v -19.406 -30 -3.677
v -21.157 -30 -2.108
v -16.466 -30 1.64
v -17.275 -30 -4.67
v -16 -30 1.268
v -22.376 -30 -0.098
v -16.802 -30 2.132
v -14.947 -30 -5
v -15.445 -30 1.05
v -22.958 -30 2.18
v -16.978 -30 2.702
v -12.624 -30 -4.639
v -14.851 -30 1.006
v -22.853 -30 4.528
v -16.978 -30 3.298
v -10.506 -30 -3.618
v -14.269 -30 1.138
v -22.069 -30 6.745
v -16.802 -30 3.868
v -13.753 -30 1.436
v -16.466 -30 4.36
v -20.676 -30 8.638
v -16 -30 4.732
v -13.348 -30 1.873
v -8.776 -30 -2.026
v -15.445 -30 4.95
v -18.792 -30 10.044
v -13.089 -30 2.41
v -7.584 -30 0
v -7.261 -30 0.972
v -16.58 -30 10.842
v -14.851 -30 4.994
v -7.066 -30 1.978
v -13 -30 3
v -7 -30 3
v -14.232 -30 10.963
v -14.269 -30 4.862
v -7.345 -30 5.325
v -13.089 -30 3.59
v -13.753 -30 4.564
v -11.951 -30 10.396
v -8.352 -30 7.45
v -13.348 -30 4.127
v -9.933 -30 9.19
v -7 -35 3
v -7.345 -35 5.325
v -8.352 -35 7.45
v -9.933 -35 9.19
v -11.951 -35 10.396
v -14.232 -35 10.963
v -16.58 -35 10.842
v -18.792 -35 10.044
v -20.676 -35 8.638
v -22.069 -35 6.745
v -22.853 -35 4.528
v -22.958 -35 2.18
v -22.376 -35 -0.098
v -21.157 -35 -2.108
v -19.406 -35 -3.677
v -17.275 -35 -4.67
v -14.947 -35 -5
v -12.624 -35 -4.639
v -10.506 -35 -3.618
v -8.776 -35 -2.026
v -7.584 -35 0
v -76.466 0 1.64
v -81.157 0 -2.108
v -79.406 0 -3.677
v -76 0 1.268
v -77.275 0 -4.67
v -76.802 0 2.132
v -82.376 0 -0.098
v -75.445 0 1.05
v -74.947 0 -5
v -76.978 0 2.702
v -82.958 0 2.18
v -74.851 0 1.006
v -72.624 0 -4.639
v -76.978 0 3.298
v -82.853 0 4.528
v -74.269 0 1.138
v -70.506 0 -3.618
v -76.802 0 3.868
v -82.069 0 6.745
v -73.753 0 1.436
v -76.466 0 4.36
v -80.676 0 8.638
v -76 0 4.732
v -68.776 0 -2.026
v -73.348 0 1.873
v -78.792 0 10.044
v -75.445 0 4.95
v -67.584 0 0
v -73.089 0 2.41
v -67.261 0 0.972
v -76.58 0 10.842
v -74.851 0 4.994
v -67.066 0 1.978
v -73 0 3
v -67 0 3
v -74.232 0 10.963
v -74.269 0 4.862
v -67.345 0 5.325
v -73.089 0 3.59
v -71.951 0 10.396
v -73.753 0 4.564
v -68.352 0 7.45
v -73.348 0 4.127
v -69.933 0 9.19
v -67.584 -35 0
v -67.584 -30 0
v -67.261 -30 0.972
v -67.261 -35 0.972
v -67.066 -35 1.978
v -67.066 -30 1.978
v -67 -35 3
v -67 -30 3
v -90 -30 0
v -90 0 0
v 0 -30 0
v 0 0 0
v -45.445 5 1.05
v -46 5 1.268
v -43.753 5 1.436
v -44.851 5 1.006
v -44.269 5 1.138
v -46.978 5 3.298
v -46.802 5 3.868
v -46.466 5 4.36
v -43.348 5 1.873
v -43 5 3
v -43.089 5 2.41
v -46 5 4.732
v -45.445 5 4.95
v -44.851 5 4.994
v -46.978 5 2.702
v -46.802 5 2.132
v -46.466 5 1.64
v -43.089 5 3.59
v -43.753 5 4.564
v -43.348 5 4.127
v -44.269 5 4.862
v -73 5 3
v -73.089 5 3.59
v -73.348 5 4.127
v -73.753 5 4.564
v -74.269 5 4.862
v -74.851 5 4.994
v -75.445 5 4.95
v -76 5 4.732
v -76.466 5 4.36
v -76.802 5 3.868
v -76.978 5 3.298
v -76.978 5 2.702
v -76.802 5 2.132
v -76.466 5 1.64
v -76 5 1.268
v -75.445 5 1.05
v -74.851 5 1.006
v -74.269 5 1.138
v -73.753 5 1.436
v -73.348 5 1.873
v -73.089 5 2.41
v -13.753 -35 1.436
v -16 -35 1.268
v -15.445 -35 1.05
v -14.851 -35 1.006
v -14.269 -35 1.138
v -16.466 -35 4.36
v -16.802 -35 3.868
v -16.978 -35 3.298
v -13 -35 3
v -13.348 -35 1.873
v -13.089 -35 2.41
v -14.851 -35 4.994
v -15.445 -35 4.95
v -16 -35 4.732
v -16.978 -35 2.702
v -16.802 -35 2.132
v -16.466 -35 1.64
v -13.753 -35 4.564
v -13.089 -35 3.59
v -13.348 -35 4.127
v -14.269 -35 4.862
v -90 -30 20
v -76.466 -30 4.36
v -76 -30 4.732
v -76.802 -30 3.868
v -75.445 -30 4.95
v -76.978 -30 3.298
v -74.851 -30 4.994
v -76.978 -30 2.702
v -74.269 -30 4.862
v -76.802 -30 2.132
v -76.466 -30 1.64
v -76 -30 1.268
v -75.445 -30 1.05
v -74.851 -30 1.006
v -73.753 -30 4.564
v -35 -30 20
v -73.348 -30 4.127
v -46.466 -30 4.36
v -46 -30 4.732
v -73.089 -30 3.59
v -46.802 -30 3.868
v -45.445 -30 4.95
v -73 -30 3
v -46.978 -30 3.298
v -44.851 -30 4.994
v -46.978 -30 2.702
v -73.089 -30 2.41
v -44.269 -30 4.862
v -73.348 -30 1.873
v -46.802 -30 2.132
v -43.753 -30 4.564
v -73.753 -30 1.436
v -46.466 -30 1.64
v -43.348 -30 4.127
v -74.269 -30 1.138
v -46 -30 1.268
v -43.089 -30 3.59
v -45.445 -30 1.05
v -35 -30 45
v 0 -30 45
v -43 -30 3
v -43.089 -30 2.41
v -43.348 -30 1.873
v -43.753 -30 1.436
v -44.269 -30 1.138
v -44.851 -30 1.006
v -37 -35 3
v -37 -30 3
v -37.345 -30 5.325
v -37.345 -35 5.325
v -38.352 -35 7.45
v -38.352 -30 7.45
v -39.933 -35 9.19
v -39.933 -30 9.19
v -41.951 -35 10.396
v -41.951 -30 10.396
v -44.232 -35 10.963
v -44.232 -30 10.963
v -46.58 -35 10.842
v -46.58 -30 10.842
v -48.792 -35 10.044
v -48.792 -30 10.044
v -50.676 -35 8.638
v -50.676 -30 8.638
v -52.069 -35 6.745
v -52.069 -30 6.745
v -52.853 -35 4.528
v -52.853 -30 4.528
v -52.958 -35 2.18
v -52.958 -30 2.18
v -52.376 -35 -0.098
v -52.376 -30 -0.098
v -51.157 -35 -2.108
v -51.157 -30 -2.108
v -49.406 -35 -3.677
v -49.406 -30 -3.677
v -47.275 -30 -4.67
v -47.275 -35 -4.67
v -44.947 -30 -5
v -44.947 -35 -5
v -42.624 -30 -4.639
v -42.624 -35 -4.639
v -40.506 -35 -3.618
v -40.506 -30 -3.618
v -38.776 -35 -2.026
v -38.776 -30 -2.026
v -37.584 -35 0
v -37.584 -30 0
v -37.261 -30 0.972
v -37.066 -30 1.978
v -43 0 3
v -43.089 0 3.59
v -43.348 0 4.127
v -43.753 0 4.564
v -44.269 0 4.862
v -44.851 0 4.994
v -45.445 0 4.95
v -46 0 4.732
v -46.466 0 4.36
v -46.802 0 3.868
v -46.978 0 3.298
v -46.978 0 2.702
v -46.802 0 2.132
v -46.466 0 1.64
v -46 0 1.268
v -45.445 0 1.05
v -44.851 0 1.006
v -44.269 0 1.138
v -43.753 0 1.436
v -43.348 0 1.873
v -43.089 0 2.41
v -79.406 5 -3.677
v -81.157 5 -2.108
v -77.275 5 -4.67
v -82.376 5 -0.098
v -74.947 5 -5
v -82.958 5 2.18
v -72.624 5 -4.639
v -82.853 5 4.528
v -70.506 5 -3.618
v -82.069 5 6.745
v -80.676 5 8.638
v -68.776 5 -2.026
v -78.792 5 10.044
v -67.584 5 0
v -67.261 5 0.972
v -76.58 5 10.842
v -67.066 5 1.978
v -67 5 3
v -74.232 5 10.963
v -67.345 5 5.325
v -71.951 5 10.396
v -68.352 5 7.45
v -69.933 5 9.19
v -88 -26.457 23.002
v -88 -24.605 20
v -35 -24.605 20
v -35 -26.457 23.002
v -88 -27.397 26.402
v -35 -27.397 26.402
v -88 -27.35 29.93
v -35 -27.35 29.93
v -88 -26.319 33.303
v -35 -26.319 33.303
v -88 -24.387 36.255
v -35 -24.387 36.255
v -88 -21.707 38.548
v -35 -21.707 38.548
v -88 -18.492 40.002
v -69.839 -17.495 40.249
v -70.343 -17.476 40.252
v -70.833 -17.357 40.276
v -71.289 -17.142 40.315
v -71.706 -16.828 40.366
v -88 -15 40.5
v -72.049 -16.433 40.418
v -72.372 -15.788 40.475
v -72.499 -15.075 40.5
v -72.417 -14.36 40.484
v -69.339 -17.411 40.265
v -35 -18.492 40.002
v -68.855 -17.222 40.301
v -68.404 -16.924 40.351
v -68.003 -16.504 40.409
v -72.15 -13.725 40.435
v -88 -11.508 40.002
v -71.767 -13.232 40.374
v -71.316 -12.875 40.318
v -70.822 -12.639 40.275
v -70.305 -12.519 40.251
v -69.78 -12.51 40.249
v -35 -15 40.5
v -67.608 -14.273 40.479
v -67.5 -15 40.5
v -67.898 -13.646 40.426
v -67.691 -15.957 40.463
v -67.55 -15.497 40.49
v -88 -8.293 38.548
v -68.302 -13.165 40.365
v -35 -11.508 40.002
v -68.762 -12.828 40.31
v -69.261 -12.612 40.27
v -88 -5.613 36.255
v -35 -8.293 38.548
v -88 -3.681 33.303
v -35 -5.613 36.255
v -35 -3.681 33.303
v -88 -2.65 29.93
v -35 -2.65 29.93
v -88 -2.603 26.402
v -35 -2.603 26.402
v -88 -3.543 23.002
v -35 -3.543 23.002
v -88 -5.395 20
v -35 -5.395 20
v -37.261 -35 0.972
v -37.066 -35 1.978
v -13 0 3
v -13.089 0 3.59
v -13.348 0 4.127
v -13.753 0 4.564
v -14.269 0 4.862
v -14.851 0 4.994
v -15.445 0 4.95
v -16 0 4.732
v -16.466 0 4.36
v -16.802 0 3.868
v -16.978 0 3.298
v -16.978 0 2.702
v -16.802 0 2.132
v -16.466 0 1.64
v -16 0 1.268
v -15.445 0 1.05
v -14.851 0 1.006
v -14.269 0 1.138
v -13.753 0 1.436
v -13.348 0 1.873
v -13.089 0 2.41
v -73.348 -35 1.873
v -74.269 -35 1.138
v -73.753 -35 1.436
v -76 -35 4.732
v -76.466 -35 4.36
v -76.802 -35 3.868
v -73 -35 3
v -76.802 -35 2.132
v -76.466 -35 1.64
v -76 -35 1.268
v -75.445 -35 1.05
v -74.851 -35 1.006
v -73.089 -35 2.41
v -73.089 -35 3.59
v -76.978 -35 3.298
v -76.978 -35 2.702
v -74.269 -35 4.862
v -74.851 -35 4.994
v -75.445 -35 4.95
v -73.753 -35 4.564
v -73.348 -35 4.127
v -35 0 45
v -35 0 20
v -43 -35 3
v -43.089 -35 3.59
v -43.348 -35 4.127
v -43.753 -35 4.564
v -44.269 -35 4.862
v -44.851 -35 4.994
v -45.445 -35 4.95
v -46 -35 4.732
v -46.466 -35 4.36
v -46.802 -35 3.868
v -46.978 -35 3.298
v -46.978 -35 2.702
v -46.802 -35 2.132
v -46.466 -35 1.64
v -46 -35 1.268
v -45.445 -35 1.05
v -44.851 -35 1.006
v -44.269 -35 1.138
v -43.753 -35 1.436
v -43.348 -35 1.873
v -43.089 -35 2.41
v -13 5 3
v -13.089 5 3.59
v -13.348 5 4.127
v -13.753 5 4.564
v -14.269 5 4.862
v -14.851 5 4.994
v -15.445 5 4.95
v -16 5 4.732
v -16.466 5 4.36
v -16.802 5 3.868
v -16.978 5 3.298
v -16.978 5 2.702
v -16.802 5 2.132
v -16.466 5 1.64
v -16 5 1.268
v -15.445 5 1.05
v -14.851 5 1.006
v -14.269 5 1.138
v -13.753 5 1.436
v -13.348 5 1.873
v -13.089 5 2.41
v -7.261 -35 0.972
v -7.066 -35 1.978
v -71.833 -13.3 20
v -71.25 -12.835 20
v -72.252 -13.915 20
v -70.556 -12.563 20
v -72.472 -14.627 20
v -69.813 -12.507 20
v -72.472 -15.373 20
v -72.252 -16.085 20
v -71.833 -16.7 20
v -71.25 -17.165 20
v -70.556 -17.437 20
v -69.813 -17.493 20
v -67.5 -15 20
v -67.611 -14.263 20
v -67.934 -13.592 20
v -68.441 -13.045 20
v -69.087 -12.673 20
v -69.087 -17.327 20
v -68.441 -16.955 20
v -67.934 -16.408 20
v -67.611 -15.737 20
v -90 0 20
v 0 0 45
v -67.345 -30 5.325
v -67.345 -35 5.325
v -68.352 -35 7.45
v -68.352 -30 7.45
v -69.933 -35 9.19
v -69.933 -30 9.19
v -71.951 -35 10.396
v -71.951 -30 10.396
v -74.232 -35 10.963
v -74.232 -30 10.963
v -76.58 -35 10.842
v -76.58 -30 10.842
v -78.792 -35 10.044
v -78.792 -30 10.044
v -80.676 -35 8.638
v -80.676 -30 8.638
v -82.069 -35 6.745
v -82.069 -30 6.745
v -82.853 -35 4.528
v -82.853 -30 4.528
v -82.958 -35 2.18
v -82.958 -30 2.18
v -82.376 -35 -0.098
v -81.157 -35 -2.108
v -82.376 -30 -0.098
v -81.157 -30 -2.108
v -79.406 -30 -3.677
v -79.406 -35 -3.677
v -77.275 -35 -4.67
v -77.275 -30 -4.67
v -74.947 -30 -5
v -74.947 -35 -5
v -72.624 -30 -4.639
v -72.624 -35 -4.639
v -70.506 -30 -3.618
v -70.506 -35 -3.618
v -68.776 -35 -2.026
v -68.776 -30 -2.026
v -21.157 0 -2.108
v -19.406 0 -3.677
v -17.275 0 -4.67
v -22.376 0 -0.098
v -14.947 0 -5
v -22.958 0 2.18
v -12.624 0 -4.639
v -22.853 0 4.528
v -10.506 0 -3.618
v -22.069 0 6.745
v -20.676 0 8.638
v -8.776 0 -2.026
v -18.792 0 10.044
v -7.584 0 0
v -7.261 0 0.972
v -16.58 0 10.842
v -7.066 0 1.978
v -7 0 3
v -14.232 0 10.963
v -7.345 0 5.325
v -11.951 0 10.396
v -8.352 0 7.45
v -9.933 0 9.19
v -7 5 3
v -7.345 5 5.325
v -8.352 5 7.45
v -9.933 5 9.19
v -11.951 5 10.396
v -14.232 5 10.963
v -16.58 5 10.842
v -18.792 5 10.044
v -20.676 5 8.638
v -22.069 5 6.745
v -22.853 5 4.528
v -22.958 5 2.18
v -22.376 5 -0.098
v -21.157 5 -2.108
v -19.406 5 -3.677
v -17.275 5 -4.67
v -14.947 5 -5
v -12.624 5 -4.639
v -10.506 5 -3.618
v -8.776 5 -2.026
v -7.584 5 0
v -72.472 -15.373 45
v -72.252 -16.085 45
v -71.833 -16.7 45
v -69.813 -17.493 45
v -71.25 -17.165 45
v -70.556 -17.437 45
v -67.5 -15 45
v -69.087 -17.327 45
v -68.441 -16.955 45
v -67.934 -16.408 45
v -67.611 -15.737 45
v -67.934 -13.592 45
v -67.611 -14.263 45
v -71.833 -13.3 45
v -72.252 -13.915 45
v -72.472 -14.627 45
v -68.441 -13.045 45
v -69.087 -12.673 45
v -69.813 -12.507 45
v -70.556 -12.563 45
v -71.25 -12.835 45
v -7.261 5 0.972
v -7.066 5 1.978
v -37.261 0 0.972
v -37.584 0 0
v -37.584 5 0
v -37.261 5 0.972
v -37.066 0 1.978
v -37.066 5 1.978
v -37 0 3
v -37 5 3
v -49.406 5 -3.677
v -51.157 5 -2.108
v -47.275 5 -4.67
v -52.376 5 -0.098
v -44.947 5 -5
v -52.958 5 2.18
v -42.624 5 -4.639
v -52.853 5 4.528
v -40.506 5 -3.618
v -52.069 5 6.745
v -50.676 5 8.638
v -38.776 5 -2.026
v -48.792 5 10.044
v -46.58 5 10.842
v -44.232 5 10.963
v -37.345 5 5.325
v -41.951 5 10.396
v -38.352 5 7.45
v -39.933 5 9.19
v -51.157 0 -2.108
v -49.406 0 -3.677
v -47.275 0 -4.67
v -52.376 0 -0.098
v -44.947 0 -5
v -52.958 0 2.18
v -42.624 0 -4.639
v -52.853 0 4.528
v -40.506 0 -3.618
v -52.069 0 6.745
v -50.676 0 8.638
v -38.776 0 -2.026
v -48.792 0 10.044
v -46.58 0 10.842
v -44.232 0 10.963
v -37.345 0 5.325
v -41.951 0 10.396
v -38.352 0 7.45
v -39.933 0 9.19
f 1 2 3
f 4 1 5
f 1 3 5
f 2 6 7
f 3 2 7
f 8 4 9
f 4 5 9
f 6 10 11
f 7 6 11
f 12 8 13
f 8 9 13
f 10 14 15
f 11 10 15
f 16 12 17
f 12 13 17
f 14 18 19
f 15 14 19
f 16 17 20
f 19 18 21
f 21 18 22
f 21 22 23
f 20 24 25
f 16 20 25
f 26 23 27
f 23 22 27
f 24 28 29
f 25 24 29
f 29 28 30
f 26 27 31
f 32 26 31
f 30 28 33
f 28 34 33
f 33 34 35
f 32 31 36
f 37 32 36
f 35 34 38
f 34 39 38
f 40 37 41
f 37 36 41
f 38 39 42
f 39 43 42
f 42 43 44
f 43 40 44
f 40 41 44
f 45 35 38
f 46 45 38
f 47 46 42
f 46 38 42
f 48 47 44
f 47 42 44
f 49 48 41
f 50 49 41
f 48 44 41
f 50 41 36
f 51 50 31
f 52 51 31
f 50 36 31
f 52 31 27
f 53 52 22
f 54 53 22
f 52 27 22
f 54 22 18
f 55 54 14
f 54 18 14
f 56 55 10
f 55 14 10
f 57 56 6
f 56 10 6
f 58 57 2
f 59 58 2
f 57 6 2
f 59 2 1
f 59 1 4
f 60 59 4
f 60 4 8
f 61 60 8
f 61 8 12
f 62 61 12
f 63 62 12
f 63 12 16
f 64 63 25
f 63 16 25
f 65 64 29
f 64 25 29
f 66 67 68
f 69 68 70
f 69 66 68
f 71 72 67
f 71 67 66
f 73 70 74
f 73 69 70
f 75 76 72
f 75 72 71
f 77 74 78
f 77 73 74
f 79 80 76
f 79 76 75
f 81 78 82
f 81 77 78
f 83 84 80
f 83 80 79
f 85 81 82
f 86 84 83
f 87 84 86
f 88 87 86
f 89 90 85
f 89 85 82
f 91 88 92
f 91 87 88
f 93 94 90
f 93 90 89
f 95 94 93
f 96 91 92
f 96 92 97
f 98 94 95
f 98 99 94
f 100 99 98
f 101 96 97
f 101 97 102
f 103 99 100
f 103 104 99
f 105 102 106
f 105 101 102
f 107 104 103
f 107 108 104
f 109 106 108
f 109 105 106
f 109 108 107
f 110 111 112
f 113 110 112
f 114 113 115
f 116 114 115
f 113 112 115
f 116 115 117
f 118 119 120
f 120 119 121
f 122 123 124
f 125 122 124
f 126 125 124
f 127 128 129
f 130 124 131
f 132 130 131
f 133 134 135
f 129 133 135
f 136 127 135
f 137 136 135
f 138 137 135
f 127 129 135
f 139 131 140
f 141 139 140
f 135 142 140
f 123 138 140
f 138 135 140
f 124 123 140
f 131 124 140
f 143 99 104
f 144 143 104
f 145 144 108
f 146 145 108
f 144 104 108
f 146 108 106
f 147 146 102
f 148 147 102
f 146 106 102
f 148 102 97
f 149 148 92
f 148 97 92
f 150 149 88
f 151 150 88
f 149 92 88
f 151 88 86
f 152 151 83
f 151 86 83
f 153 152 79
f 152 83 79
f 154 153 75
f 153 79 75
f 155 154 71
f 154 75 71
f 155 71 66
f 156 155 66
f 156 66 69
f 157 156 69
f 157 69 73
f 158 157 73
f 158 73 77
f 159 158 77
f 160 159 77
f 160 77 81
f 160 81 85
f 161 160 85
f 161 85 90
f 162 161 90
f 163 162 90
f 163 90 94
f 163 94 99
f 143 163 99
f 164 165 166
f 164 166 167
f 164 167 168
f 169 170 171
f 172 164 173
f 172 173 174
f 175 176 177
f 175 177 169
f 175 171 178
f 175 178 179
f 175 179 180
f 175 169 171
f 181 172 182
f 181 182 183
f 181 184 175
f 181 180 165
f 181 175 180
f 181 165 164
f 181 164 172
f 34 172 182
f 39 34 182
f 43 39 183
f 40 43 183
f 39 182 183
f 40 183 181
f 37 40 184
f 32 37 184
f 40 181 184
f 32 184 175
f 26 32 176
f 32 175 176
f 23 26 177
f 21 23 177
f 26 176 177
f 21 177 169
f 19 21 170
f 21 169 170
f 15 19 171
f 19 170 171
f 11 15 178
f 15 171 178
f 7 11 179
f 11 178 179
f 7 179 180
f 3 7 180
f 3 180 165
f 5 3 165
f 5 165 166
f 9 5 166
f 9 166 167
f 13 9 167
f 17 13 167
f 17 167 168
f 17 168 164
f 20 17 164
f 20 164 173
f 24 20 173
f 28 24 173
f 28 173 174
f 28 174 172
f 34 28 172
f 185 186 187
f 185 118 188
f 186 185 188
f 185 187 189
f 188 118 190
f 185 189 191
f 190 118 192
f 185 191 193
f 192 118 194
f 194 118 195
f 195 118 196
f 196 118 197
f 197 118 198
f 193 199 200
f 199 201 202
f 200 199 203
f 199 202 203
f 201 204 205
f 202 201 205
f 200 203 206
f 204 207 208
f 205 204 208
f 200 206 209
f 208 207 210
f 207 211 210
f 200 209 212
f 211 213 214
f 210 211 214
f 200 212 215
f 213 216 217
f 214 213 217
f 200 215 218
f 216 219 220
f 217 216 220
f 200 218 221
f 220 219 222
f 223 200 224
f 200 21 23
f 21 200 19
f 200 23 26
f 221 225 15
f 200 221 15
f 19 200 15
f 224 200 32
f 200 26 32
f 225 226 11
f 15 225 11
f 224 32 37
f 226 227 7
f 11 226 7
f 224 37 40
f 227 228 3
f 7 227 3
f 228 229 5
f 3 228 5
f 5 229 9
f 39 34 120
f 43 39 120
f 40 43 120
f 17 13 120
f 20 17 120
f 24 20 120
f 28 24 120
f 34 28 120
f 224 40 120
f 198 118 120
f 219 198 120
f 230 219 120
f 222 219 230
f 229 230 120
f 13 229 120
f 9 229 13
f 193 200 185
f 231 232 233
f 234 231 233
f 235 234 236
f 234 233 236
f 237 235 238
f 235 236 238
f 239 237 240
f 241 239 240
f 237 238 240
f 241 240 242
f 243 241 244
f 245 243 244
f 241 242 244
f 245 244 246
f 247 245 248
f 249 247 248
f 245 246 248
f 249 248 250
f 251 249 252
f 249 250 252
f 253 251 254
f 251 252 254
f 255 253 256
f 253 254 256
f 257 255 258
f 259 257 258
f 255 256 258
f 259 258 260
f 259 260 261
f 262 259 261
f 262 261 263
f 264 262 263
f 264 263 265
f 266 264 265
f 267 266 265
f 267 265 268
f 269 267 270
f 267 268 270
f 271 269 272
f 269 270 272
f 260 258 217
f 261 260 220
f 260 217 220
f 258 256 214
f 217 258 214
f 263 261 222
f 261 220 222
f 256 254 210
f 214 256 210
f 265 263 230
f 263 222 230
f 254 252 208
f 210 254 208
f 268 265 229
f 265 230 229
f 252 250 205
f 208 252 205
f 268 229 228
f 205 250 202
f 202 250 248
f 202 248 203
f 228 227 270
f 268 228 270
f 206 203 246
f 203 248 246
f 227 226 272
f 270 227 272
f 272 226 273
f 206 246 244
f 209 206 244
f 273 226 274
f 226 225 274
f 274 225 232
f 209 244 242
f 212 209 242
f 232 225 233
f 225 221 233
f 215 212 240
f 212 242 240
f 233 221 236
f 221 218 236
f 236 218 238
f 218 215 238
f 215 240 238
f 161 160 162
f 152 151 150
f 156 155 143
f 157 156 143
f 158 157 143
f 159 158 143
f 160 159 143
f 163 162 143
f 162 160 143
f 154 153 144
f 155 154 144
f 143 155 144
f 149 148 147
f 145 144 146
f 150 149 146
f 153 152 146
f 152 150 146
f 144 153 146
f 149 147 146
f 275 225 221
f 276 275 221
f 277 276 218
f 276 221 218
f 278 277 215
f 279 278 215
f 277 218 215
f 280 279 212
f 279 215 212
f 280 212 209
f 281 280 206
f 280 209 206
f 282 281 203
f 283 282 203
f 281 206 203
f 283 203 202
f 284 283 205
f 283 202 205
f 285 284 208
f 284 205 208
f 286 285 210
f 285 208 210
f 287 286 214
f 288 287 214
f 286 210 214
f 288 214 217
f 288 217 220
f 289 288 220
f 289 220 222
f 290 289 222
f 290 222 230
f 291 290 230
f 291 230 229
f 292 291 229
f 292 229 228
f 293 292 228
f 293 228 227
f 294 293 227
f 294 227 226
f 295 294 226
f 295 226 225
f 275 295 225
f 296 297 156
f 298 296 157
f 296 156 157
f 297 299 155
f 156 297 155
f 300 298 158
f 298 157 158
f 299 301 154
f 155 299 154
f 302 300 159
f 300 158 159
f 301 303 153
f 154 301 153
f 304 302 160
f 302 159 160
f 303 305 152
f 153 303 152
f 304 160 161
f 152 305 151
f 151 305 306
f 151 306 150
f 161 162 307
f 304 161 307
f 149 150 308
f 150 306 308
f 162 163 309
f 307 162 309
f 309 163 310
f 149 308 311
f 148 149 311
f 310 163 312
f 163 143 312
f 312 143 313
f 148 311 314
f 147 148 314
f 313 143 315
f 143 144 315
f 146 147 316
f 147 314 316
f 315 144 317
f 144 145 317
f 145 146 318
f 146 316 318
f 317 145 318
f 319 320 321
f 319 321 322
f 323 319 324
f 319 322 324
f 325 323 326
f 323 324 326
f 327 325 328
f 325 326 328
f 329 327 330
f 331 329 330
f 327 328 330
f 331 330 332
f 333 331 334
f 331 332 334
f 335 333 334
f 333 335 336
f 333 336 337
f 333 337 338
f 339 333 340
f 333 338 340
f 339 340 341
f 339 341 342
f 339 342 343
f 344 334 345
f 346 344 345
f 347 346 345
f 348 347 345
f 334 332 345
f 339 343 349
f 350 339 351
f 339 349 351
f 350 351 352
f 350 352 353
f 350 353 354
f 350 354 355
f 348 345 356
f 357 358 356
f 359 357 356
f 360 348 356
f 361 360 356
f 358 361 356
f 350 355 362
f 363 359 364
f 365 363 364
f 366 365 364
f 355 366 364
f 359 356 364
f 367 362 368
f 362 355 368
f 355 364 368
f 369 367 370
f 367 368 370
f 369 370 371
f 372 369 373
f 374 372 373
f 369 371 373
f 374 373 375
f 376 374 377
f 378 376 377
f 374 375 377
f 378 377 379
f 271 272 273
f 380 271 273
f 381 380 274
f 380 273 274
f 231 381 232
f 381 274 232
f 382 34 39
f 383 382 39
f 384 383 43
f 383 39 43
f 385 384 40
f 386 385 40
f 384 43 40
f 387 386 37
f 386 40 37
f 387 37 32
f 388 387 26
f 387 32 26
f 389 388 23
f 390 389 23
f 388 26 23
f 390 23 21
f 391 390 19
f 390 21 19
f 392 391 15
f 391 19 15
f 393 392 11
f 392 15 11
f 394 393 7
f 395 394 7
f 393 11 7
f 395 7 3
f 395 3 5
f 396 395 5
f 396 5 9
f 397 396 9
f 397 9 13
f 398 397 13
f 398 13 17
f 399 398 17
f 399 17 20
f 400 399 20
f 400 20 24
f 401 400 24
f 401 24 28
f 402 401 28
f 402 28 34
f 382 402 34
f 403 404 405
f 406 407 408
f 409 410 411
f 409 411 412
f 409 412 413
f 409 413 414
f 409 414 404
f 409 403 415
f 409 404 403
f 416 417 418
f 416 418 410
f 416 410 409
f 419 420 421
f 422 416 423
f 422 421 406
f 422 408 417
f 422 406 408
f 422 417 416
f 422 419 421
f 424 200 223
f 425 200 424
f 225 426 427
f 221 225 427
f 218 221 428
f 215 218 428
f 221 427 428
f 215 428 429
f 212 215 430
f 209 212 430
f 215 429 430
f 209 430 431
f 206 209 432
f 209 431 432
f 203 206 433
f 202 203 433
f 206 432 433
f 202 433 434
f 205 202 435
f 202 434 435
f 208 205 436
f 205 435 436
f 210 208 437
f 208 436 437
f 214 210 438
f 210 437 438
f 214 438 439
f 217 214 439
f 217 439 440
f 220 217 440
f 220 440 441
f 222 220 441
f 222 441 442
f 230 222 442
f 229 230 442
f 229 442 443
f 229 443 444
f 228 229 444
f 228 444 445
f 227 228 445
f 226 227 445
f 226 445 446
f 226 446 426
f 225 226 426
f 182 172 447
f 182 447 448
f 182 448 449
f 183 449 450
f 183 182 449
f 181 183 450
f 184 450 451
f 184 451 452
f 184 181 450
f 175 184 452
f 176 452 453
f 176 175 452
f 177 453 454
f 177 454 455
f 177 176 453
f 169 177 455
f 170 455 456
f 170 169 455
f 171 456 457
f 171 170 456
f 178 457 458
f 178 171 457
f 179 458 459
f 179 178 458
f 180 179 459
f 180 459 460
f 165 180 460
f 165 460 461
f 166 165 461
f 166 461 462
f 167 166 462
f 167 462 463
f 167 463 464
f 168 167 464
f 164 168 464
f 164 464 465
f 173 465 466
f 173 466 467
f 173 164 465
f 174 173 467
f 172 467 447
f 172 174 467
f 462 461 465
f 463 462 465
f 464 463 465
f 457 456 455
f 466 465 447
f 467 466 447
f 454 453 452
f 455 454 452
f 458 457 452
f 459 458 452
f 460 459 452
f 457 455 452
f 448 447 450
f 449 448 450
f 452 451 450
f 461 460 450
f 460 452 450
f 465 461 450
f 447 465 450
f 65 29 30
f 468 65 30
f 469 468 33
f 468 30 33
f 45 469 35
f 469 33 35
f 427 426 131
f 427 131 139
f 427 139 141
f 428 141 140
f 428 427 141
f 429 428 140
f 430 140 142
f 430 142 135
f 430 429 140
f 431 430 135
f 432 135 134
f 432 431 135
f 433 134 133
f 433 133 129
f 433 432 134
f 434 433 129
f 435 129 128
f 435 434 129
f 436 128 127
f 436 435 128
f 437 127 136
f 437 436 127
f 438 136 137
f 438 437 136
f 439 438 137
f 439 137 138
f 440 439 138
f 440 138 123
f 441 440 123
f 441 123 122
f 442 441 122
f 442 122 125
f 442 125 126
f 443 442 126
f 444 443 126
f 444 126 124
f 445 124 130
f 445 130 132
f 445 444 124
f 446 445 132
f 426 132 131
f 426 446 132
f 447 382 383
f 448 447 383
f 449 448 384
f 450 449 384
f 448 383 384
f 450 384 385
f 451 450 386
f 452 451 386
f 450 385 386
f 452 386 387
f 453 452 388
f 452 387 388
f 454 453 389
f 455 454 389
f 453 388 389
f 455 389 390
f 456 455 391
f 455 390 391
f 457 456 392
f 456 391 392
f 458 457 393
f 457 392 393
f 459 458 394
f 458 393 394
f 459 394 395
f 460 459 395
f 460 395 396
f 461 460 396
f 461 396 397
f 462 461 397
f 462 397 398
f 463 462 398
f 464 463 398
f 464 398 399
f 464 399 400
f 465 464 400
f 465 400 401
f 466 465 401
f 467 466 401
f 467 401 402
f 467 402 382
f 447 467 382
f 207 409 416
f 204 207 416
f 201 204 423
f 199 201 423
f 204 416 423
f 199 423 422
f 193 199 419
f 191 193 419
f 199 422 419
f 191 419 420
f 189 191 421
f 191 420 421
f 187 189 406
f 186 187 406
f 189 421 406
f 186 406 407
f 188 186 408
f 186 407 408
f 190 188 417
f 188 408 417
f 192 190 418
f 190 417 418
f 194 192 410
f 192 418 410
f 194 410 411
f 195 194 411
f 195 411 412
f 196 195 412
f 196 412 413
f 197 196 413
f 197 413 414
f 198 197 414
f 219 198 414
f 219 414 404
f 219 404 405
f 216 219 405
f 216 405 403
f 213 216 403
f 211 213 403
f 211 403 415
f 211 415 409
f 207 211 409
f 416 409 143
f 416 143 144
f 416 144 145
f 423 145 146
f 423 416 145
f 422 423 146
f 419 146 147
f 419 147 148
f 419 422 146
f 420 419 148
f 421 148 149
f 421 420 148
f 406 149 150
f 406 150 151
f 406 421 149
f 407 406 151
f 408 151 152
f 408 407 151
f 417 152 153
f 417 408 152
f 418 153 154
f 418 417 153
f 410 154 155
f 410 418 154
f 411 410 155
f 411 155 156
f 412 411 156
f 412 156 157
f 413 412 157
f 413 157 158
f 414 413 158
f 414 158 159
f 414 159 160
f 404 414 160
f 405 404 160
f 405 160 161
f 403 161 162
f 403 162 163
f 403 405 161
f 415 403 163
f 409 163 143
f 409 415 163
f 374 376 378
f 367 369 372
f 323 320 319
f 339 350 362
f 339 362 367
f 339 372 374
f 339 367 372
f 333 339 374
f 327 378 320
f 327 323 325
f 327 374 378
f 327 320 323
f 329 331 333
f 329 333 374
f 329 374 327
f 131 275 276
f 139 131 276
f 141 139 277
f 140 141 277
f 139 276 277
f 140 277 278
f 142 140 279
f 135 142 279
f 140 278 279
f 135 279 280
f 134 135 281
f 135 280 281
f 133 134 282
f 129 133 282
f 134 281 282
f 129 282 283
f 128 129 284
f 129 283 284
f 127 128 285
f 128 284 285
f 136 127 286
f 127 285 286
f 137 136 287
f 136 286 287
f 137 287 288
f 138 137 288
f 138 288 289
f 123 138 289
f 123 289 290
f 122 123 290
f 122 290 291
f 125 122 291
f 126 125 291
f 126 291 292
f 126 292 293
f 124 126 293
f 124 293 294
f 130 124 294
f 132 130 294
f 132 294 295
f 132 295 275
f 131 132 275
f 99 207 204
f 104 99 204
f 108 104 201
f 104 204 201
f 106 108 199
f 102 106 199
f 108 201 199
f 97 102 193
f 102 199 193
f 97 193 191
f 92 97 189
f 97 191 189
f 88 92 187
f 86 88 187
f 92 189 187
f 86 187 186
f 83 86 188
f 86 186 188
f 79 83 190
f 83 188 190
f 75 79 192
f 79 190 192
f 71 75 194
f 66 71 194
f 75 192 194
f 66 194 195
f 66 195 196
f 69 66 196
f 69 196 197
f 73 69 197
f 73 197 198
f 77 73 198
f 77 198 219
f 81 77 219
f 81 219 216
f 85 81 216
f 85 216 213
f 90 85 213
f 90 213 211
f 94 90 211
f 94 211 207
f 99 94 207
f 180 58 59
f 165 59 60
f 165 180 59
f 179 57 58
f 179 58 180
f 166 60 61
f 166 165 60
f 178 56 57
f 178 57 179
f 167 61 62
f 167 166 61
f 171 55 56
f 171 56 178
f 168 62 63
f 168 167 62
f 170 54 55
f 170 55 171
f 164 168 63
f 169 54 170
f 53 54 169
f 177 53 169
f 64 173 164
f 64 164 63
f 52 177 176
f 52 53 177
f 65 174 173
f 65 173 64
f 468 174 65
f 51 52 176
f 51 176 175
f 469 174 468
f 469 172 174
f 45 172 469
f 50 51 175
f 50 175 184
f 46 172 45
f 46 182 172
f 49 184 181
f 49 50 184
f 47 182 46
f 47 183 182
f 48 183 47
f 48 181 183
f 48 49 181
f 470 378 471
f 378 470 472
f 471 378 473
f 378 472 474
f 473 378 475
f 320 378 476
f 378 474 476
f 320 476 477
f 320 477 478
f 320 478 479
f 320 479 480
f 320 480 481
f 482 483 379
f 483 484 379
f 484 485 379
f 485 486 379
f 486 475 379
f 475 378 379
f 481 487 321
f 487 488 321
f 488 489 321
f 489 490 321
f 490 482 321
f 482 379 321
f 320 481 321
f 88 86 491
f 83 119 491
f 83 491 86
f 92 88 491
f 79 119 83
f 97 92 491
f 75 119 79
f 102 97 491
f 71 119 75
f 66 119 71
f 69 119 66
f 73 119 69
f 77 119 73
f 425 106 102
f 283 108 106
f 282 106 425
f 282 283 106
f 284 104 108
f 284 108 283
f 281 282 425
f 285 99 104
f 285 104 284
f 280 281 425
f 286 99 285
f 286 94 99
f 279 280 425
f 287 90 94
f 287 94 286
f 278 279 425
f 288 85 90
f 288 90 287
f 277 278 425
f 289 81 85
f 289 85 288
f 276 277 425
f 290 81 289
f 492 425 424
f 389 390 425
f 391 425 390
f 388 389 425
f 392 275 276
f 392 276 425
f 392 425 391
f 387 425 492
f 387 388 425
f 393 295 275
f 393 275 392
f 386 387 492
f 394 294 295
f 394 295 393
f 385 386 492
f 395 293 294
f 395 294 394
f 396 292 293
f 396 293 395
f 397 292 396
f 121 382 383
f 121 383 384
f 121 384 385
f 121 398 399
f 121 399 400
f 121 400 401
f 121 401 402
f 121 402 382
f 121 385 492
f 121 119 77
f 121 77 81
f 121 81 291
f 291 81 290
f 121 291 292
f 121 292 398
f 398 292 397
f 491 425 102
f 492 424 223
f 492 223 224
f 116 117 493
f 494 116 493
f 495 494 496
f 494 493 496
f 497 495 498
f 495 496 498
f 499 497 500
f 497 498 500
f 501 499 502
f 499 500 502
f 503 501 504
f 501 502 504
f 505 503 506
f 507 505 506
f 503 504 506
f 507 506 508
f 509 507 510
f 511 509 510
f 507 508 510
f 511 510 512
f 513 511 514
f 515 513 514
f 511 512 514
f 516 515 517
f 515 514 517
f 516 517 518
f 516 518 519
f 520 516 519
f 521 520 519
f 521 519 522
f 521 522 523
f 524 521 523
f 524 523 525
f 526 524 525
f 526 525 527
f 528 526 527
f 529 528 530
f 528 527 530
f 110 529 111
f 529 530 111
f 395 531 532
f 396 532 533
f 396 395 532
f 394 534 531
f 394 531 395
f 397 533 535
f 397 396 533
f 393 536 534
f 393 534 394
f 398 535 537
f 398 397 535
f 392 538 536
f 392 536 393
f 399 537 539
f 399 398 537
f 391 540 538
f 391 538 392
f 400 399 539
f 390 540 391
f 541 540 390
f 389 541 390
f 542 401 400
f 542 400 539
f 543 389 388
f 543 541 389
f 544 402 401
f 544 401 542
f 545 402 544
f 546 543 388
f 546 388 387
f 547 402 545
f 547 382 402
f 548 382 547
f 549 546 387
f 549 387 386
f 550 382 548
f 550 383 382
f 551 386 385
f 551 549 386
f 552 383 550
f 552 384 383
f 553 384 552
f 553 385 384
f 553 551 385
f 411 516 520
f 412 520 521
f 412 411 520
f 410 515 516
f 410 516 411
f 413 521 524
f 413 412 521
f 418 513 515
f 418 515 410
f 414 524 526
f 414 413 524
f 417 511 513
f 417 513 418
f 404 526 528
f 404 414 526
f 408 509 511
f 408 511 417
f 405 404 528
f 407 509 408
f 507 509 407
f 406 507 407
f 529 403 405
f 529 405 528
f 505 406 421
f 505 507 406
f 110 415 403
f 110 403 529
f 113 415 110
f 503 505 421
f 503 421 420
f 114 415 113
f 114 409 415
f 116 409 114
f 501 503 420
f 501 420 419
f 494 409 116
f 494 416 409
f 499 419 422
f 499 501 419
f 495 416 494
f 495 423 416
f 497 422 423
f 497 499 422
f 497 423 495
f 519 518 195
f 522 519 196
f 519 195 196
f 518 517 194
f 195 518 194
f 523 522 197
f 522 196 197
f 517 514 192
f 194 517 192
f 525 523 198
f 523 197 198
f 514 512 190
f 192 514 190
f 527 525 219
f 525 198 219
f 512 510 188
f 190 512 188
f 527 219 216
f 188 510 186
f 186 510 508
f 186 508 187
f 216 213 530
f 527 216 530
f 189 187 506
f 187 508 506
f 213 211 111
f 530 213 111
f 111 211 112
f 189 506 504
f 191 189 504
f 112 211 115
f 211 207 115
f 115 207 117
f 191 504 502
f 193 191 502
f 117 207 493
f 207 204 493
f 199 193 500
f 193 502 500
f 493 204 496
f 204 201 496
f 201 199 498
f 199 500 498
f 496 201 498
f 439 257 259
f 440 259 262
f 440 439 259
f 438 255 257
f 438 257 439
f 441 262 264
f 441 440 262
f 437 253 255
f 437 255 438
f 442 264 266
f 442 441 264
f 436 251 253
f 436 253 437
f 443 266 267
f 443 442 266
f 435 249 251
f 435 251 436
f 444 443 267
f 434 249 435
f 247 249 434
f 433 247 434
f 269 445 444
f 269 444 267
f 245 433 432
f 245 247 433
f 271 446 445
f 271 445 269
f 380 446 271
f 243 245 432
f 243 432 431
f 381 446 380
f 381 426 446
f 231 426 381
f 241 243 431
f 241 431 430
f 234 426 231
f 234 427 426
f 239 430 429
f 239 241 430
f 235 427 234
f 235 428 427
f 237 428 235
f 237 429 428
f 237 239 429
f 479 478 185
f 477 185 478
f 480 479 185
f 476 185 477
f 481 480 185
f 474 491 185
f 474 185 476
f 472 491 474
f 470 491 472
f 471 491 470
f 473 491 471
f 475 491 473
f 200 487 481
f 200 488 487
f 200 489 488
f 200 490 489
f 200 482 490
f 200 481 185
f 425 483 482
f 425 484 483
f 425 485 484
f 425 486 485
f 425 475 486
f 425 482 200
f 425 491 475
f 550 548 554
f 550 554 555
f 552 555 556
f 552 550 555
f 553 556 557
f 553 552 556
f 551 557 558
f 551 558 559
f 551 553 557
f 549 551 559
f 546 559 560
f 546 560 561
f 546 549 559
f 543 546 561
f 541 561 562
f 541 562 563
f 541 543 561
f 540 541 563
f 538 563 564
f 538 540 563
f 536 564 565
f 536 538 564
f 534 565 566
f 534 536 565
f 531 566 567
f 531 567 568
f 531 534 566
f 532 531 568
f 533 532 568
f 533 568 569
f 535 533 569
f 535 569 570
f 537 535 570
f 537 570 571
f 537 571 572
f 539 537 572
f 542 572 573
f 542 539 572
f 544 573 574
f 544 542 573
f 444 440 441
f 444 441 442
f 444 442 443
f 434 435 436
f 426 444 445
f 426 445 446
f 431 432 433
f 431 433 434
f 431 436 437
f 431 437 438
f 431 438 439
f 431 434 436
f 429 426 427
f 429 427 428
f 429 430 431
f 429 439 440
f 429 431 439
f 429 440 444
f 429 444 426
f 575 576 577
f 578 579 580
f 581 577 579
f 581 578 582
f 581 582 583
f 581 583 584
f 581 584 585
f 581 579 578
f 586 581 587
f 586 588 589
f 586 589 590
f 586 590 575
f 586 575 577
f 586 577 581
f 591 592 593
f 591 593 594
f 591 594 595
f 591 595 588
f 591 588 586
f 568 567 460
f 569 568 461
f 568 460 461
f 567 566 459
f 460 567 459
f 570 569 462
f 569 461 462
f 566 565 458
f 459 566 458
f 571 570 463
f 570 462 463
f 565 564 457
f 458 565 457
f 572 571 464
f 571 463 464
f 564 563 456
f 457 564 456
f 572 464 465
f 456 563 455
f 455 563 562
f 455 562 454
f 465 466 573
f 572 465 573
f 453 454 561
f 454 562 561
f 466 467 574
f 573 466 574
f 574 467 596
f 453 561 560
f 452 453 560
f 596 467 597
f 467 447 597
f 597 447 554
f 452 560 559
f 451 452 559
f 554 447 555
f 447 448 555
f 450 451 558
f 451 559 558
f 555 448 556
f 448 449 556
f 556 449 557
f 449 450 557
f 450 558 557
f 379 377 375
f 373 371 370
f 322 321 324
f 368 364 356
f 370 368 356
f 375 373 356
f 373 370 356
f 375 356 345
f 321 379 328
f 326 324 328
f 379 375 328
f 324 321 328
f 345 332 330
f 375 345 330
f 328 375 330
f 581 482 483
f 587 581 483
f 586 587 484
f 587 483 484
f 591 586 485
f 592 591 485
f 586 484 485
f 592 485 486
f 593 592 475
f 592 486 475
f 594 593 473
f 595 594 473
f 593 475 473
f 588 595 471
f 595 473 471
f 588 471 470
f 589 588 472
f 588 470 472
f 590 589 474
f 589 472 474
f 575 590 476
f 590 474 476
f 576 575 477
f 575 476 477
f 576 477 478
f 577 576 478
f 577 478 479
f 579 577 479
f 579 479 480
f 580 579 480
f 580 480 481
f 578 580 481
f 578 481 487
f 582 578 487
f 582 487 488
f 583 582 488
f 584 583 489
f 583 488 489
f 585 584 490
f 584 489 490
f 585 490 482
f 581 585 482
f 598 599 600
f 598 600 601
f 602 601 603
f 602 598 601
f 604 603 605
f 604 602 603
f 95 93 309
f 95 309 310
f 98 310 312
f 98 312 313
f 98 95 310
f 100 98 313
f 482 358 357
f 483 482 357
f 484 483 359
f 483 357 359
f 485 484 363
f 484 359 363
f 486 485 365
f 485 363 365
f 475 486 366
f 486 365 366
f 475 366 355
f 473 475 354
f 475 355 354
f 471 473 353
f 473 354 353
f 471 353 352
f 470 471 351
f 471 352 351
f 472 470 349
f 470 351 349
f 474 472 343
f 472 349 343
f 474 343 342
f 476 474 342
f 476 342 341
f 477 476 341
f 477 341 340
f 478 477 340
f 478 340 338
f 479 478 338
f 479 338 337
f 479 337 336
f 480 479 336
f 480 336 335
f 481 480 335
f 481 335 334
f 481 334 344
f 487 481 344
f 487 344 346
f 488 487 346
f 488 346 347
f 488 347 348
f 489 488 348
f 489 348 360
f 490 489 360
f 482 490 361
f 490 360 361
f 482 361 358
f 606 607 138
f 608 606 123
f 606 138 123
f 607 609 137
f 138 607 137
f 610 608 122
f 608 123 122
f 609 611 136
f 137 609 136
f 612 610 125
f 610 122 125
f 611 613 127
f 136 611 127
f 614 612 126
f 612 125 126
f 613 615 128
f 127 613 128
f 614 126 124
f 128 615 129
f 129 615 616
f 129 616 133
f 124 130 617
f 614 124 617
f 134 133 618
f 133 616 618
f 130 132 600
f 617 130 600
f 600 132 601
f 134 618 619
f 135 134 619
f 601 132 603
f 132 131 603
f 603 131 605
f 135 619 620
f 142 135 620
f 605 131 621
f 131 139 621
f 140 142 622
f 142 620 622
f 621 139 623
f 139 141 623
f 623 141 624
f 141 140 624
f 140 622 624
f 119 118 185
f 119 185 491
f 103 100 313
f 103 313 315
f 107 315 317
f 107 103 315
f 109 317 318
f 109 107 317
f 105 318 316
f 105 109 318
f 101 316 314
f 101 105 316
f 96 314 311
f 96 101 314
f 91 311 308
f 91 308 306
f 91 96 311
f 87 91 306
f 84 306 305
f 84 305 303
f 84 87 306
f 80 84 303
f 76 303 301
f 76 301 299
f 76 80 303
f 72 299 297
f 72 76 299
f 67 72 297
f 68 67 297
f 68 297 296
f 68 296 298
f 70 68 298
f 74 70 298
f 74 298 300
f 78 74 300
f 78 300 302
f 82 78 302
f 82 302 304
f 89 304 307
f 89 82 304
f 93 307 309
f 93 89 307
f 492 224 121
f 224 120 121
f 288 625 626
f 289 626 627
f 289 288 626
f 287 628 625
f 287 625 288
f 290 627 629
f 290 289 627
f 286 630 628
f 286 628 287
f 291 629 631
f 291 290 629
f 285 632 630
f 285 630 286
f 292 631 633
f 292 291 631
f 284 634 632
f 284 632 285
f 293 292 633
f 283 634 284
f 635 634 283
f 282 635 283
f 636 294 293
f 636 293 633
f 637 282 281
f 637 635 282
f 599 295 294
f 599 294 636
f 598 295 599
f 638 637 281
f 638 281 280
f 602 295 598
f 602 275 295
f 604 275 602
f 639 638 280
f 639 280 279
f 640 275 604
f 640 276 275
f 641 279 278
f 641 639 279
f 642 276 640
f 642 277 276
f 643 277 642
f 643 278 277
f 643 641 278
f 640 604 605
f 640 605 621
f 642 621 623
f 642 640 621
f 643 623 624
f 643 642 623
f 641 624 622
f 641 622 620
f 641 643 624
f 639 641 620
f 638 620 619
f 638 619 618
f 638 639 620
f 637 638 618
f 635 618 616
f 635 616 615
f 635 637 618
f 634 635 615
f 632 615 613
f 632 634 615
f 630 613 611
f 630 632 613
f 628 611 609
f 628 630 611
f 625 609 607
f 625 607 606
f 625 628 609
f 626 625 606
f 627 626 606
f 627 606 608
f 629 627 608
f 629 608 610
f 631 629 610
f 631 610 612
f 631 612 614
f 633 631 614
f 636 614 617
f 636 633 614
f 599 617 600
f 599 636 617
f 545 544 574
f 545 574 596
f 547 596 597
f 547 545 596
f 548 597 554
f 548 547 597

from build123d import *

# Parameters (mm, degrees)
F0_W      = 90
F0_H      = 30
F1_DEPTH  = 20
F2_W      = 35
F2_H      = 30
F3_DEPTH  = 25
F5_DEPTH  = 53
F6_R      = 2.5
F7_DEPTH  = 69.3
F8_R      = 2.5
F9_DEPTH  = 25
F11_DEPTH = 5
F14_R     = 2
F15_DEPTH = 56.1
F16_R     = 2
F17_DEPTH = 40


with BuildPart() as f1:
    # F0 (on Top) → F1 (new body)
    with BuildSketch(Plane.XY):
        with Locations((-45, -15)):
            Rectangle(F0_W, F0_H)
    extrude(amount=F1_DEPTH)

    # F2 (on face) → F3 (join)
    with BuildSketch(Plane.XY.offset(20)):
        with Locations((-17.5, -15)):
            Rectangle(F2_W, F2_H)
    extrude(amount=F3_DEPTH)

    # F8 (on face) → F9 (join)
    with BuildSketch(Plane.XY.offset(20)):
        with Locations((-70, -15)):
            Circle(F8_R)
    extrude(amount=F9_DEPTH)


with BuildPart() as f5:
    # F4 (on face) → F5 (new body)
    with BuildSketch(Plane(origin=(-35, 0, 0), x_dir=(0, -1, 0), z_dir=(-1, 0, 0))):
        with BuildLine():
            Line((5.3953136439, 20), (24.6046863561, 20))
            ThreePointArc((24.6046863561, 20), (15, 40.5), (5.3953136439, 20))
        make_face()
    extrude(amount=F5_DEPTH)

    # F6 (on face) → F7 (cut)
    with BuildSketch(Plane.XY.offset(45)):
        with Locations((-70, -15)):
            Circle(F6_R)
    extrude(amount=-F7_DEPTH, mode=Mode.SUBTRACT)


with BuildPart() as f11:
    # F10 (on face) → F11 (new body)
    with BuildSketch(Plane.XZ.offset(30)):
        with BuildLine():
            Line((-67.5838015129, 0), (-82.4161984871, 0))
            ThreePointArc((-82.4161984871, 0), (-75, -5), (-67.5838015129, 0))
        make_face()
        with BuildLine():
            ThreePointArc((-67.5838015129, 0), (-67.14730658, 1.4718619003), (-67, 3))
            ThreePointArc((-67, 3), (-76.5281380997, 10.85269342), (-82.4161984871, 0))
            Line((-82.4161984871, 0), (-67.5838015129, 0))
        make_face()
    extrude(amount=F11_DEPTH)


with BuildPart() as f11b:
    # F10 (on face) → F11, piece 2 (new body)
    with BuildSketch(Plane.XZ.offset(30)):
        with BuildLine():
            ThreePointArc((-37, 3), (-46.5281380997, 10.85269342), (-52.4161984871, 0))
            Line((-52.4161984871, 0), (-37.5838015129, 0))
            ThreePointArc((-37.5838015129, 0), (-37.14730658, 1.4718619003), (-37, 3))
        make_face()
        with BuildLine():
            Line((-37.5838015129, 0), (-52.4161984871, 0))
            ThreePointArc((-52.4161984871, 0), (-45, -5), (-37.5838015129, 0))
        make_face()
    extrude(amount=F11_DEPTH)


with BuildPart() as f11c:
    # F10 (on face) → F11, piece 3 (new body)
    with BuildSketch(Plane.XZ.offset(30)):
        with BuildLine():
            ThreePointArc((-7, 3), (-16.5281380997, 10.85269342), (-22.4161984871, 0))
            Line((-22.4161984871, 0), (-7.5838015129, 0))
            ThreePointArc((-7.5838015129, 0), (-7.14730658, 1.4718619003), (-7, 3))
        make_face()
        with BuildLine():
            Line((-7.5838015129, 0), (-22.4161984871, 0))
            ThreePointArc((-22.4161984871, 0), (-15, -5), (-7.5838015129, 0))
        make_face()
    extrude(amount=F11_DEPTH)


with BuildPart() as f13_1:
    # F13: instance of F11
    add(f11.part.mirror(Plane.XZ.offset(15)))


with BuildPart() as f13_2:
    # F13: instance of F11b
    add(f11b.part.mirror(Plane.XZ.offset(15)))


with BuildPart() as f13_3:
    # F13: instance of F11c
    add(f11c.part.mirror(Plane.XZ.offset(15)))


with BuildPart() as f15_tool:
    # F14 (on face) → F15 (new body)
    with BuildSketch(Plane.XZ.offset(35)):
        with Locations((-45, 3)):
            Circle(F14_R)
        with Locations((-15, 3)):
            Circle(F14_R)
        with Locations((-75, 3)):
            Circle(F14_R)
    extrude(amount=-F15_DEPTH)


with BuildPart() as f1_1:
    add(f1.part)

    # F15: cut by f15_tool
    add(f15_tool.part, mode=Mode.SUBTRACT)


with BuildPart() as f11_1:
    add(f11.part)

    # F15: cut by f15_tool
    add(f15_tool.part, mode=Mode.SUBTRACT)


with BuildPart() as f11b_1:
    add(f11b.part)

    # F15: cut by f15_tool
    add(f15_tool.part, mode=Mode.SUBTRACT)


with BuildPart() as f11c_1:
    add(f11c.part)

    # F15: cut by f15_tool
    add(f15_tool.part, mode=Mode.SUBTRACT)


with BuildPart() as f13_1_1:
    add(f13_1.part)

    # F15: cut by f15_tool
    add(f15_tool.part, mode=Mode.SUBTRACT)


with BuildPart() as f13_2_1:
    add(f13_2.part)

    # F15: cut by f15_tool
    add(f15_tool.part, mode=Mode.SUBTRACT)


with BuildPart() as f13_3_1:
    add(f13_3.part)

    # F15: cut by f15_tool
    add(f15_tool.part, mode=Mode.SUBTRACT)


with BuildPart() as f17:
    # F16 (on face) → F17 (new body, through all)
    with BuildSketch(Plane.XZ.offset(35)):
        with Locations((-75, 3)):
            Circle(F16_R)
    extrude(amount=-F17_DEPTH)


with BuildPart() as f17b:
    # F16 (on face) → F17, piece 2 (new body, through all)
    with BuildSketch(Plane.XZ.offset(35)):
        with Locations((-45, 3)):
            Circle(F16_R)
    extrude(amount=-F17_DEPTH)


with BuildPart() as f17c:
    # F16 (on face) → F17, piece 3 (new body, through all)
    with BuildSketch(Plane.XZ.offset(35)):
        with Locations((-15, 3)):
            Circle(F16_R)
    extrude(amount=-F17_DEPTH)


solid = Compound([f5.part, f1_1.part, f11_1.part, f11b_1.part, f11c_1.part, f13_1_1.part, f13_2_1.part, f13_3_1.part, f17.part, f17b.part, f17c.part])
